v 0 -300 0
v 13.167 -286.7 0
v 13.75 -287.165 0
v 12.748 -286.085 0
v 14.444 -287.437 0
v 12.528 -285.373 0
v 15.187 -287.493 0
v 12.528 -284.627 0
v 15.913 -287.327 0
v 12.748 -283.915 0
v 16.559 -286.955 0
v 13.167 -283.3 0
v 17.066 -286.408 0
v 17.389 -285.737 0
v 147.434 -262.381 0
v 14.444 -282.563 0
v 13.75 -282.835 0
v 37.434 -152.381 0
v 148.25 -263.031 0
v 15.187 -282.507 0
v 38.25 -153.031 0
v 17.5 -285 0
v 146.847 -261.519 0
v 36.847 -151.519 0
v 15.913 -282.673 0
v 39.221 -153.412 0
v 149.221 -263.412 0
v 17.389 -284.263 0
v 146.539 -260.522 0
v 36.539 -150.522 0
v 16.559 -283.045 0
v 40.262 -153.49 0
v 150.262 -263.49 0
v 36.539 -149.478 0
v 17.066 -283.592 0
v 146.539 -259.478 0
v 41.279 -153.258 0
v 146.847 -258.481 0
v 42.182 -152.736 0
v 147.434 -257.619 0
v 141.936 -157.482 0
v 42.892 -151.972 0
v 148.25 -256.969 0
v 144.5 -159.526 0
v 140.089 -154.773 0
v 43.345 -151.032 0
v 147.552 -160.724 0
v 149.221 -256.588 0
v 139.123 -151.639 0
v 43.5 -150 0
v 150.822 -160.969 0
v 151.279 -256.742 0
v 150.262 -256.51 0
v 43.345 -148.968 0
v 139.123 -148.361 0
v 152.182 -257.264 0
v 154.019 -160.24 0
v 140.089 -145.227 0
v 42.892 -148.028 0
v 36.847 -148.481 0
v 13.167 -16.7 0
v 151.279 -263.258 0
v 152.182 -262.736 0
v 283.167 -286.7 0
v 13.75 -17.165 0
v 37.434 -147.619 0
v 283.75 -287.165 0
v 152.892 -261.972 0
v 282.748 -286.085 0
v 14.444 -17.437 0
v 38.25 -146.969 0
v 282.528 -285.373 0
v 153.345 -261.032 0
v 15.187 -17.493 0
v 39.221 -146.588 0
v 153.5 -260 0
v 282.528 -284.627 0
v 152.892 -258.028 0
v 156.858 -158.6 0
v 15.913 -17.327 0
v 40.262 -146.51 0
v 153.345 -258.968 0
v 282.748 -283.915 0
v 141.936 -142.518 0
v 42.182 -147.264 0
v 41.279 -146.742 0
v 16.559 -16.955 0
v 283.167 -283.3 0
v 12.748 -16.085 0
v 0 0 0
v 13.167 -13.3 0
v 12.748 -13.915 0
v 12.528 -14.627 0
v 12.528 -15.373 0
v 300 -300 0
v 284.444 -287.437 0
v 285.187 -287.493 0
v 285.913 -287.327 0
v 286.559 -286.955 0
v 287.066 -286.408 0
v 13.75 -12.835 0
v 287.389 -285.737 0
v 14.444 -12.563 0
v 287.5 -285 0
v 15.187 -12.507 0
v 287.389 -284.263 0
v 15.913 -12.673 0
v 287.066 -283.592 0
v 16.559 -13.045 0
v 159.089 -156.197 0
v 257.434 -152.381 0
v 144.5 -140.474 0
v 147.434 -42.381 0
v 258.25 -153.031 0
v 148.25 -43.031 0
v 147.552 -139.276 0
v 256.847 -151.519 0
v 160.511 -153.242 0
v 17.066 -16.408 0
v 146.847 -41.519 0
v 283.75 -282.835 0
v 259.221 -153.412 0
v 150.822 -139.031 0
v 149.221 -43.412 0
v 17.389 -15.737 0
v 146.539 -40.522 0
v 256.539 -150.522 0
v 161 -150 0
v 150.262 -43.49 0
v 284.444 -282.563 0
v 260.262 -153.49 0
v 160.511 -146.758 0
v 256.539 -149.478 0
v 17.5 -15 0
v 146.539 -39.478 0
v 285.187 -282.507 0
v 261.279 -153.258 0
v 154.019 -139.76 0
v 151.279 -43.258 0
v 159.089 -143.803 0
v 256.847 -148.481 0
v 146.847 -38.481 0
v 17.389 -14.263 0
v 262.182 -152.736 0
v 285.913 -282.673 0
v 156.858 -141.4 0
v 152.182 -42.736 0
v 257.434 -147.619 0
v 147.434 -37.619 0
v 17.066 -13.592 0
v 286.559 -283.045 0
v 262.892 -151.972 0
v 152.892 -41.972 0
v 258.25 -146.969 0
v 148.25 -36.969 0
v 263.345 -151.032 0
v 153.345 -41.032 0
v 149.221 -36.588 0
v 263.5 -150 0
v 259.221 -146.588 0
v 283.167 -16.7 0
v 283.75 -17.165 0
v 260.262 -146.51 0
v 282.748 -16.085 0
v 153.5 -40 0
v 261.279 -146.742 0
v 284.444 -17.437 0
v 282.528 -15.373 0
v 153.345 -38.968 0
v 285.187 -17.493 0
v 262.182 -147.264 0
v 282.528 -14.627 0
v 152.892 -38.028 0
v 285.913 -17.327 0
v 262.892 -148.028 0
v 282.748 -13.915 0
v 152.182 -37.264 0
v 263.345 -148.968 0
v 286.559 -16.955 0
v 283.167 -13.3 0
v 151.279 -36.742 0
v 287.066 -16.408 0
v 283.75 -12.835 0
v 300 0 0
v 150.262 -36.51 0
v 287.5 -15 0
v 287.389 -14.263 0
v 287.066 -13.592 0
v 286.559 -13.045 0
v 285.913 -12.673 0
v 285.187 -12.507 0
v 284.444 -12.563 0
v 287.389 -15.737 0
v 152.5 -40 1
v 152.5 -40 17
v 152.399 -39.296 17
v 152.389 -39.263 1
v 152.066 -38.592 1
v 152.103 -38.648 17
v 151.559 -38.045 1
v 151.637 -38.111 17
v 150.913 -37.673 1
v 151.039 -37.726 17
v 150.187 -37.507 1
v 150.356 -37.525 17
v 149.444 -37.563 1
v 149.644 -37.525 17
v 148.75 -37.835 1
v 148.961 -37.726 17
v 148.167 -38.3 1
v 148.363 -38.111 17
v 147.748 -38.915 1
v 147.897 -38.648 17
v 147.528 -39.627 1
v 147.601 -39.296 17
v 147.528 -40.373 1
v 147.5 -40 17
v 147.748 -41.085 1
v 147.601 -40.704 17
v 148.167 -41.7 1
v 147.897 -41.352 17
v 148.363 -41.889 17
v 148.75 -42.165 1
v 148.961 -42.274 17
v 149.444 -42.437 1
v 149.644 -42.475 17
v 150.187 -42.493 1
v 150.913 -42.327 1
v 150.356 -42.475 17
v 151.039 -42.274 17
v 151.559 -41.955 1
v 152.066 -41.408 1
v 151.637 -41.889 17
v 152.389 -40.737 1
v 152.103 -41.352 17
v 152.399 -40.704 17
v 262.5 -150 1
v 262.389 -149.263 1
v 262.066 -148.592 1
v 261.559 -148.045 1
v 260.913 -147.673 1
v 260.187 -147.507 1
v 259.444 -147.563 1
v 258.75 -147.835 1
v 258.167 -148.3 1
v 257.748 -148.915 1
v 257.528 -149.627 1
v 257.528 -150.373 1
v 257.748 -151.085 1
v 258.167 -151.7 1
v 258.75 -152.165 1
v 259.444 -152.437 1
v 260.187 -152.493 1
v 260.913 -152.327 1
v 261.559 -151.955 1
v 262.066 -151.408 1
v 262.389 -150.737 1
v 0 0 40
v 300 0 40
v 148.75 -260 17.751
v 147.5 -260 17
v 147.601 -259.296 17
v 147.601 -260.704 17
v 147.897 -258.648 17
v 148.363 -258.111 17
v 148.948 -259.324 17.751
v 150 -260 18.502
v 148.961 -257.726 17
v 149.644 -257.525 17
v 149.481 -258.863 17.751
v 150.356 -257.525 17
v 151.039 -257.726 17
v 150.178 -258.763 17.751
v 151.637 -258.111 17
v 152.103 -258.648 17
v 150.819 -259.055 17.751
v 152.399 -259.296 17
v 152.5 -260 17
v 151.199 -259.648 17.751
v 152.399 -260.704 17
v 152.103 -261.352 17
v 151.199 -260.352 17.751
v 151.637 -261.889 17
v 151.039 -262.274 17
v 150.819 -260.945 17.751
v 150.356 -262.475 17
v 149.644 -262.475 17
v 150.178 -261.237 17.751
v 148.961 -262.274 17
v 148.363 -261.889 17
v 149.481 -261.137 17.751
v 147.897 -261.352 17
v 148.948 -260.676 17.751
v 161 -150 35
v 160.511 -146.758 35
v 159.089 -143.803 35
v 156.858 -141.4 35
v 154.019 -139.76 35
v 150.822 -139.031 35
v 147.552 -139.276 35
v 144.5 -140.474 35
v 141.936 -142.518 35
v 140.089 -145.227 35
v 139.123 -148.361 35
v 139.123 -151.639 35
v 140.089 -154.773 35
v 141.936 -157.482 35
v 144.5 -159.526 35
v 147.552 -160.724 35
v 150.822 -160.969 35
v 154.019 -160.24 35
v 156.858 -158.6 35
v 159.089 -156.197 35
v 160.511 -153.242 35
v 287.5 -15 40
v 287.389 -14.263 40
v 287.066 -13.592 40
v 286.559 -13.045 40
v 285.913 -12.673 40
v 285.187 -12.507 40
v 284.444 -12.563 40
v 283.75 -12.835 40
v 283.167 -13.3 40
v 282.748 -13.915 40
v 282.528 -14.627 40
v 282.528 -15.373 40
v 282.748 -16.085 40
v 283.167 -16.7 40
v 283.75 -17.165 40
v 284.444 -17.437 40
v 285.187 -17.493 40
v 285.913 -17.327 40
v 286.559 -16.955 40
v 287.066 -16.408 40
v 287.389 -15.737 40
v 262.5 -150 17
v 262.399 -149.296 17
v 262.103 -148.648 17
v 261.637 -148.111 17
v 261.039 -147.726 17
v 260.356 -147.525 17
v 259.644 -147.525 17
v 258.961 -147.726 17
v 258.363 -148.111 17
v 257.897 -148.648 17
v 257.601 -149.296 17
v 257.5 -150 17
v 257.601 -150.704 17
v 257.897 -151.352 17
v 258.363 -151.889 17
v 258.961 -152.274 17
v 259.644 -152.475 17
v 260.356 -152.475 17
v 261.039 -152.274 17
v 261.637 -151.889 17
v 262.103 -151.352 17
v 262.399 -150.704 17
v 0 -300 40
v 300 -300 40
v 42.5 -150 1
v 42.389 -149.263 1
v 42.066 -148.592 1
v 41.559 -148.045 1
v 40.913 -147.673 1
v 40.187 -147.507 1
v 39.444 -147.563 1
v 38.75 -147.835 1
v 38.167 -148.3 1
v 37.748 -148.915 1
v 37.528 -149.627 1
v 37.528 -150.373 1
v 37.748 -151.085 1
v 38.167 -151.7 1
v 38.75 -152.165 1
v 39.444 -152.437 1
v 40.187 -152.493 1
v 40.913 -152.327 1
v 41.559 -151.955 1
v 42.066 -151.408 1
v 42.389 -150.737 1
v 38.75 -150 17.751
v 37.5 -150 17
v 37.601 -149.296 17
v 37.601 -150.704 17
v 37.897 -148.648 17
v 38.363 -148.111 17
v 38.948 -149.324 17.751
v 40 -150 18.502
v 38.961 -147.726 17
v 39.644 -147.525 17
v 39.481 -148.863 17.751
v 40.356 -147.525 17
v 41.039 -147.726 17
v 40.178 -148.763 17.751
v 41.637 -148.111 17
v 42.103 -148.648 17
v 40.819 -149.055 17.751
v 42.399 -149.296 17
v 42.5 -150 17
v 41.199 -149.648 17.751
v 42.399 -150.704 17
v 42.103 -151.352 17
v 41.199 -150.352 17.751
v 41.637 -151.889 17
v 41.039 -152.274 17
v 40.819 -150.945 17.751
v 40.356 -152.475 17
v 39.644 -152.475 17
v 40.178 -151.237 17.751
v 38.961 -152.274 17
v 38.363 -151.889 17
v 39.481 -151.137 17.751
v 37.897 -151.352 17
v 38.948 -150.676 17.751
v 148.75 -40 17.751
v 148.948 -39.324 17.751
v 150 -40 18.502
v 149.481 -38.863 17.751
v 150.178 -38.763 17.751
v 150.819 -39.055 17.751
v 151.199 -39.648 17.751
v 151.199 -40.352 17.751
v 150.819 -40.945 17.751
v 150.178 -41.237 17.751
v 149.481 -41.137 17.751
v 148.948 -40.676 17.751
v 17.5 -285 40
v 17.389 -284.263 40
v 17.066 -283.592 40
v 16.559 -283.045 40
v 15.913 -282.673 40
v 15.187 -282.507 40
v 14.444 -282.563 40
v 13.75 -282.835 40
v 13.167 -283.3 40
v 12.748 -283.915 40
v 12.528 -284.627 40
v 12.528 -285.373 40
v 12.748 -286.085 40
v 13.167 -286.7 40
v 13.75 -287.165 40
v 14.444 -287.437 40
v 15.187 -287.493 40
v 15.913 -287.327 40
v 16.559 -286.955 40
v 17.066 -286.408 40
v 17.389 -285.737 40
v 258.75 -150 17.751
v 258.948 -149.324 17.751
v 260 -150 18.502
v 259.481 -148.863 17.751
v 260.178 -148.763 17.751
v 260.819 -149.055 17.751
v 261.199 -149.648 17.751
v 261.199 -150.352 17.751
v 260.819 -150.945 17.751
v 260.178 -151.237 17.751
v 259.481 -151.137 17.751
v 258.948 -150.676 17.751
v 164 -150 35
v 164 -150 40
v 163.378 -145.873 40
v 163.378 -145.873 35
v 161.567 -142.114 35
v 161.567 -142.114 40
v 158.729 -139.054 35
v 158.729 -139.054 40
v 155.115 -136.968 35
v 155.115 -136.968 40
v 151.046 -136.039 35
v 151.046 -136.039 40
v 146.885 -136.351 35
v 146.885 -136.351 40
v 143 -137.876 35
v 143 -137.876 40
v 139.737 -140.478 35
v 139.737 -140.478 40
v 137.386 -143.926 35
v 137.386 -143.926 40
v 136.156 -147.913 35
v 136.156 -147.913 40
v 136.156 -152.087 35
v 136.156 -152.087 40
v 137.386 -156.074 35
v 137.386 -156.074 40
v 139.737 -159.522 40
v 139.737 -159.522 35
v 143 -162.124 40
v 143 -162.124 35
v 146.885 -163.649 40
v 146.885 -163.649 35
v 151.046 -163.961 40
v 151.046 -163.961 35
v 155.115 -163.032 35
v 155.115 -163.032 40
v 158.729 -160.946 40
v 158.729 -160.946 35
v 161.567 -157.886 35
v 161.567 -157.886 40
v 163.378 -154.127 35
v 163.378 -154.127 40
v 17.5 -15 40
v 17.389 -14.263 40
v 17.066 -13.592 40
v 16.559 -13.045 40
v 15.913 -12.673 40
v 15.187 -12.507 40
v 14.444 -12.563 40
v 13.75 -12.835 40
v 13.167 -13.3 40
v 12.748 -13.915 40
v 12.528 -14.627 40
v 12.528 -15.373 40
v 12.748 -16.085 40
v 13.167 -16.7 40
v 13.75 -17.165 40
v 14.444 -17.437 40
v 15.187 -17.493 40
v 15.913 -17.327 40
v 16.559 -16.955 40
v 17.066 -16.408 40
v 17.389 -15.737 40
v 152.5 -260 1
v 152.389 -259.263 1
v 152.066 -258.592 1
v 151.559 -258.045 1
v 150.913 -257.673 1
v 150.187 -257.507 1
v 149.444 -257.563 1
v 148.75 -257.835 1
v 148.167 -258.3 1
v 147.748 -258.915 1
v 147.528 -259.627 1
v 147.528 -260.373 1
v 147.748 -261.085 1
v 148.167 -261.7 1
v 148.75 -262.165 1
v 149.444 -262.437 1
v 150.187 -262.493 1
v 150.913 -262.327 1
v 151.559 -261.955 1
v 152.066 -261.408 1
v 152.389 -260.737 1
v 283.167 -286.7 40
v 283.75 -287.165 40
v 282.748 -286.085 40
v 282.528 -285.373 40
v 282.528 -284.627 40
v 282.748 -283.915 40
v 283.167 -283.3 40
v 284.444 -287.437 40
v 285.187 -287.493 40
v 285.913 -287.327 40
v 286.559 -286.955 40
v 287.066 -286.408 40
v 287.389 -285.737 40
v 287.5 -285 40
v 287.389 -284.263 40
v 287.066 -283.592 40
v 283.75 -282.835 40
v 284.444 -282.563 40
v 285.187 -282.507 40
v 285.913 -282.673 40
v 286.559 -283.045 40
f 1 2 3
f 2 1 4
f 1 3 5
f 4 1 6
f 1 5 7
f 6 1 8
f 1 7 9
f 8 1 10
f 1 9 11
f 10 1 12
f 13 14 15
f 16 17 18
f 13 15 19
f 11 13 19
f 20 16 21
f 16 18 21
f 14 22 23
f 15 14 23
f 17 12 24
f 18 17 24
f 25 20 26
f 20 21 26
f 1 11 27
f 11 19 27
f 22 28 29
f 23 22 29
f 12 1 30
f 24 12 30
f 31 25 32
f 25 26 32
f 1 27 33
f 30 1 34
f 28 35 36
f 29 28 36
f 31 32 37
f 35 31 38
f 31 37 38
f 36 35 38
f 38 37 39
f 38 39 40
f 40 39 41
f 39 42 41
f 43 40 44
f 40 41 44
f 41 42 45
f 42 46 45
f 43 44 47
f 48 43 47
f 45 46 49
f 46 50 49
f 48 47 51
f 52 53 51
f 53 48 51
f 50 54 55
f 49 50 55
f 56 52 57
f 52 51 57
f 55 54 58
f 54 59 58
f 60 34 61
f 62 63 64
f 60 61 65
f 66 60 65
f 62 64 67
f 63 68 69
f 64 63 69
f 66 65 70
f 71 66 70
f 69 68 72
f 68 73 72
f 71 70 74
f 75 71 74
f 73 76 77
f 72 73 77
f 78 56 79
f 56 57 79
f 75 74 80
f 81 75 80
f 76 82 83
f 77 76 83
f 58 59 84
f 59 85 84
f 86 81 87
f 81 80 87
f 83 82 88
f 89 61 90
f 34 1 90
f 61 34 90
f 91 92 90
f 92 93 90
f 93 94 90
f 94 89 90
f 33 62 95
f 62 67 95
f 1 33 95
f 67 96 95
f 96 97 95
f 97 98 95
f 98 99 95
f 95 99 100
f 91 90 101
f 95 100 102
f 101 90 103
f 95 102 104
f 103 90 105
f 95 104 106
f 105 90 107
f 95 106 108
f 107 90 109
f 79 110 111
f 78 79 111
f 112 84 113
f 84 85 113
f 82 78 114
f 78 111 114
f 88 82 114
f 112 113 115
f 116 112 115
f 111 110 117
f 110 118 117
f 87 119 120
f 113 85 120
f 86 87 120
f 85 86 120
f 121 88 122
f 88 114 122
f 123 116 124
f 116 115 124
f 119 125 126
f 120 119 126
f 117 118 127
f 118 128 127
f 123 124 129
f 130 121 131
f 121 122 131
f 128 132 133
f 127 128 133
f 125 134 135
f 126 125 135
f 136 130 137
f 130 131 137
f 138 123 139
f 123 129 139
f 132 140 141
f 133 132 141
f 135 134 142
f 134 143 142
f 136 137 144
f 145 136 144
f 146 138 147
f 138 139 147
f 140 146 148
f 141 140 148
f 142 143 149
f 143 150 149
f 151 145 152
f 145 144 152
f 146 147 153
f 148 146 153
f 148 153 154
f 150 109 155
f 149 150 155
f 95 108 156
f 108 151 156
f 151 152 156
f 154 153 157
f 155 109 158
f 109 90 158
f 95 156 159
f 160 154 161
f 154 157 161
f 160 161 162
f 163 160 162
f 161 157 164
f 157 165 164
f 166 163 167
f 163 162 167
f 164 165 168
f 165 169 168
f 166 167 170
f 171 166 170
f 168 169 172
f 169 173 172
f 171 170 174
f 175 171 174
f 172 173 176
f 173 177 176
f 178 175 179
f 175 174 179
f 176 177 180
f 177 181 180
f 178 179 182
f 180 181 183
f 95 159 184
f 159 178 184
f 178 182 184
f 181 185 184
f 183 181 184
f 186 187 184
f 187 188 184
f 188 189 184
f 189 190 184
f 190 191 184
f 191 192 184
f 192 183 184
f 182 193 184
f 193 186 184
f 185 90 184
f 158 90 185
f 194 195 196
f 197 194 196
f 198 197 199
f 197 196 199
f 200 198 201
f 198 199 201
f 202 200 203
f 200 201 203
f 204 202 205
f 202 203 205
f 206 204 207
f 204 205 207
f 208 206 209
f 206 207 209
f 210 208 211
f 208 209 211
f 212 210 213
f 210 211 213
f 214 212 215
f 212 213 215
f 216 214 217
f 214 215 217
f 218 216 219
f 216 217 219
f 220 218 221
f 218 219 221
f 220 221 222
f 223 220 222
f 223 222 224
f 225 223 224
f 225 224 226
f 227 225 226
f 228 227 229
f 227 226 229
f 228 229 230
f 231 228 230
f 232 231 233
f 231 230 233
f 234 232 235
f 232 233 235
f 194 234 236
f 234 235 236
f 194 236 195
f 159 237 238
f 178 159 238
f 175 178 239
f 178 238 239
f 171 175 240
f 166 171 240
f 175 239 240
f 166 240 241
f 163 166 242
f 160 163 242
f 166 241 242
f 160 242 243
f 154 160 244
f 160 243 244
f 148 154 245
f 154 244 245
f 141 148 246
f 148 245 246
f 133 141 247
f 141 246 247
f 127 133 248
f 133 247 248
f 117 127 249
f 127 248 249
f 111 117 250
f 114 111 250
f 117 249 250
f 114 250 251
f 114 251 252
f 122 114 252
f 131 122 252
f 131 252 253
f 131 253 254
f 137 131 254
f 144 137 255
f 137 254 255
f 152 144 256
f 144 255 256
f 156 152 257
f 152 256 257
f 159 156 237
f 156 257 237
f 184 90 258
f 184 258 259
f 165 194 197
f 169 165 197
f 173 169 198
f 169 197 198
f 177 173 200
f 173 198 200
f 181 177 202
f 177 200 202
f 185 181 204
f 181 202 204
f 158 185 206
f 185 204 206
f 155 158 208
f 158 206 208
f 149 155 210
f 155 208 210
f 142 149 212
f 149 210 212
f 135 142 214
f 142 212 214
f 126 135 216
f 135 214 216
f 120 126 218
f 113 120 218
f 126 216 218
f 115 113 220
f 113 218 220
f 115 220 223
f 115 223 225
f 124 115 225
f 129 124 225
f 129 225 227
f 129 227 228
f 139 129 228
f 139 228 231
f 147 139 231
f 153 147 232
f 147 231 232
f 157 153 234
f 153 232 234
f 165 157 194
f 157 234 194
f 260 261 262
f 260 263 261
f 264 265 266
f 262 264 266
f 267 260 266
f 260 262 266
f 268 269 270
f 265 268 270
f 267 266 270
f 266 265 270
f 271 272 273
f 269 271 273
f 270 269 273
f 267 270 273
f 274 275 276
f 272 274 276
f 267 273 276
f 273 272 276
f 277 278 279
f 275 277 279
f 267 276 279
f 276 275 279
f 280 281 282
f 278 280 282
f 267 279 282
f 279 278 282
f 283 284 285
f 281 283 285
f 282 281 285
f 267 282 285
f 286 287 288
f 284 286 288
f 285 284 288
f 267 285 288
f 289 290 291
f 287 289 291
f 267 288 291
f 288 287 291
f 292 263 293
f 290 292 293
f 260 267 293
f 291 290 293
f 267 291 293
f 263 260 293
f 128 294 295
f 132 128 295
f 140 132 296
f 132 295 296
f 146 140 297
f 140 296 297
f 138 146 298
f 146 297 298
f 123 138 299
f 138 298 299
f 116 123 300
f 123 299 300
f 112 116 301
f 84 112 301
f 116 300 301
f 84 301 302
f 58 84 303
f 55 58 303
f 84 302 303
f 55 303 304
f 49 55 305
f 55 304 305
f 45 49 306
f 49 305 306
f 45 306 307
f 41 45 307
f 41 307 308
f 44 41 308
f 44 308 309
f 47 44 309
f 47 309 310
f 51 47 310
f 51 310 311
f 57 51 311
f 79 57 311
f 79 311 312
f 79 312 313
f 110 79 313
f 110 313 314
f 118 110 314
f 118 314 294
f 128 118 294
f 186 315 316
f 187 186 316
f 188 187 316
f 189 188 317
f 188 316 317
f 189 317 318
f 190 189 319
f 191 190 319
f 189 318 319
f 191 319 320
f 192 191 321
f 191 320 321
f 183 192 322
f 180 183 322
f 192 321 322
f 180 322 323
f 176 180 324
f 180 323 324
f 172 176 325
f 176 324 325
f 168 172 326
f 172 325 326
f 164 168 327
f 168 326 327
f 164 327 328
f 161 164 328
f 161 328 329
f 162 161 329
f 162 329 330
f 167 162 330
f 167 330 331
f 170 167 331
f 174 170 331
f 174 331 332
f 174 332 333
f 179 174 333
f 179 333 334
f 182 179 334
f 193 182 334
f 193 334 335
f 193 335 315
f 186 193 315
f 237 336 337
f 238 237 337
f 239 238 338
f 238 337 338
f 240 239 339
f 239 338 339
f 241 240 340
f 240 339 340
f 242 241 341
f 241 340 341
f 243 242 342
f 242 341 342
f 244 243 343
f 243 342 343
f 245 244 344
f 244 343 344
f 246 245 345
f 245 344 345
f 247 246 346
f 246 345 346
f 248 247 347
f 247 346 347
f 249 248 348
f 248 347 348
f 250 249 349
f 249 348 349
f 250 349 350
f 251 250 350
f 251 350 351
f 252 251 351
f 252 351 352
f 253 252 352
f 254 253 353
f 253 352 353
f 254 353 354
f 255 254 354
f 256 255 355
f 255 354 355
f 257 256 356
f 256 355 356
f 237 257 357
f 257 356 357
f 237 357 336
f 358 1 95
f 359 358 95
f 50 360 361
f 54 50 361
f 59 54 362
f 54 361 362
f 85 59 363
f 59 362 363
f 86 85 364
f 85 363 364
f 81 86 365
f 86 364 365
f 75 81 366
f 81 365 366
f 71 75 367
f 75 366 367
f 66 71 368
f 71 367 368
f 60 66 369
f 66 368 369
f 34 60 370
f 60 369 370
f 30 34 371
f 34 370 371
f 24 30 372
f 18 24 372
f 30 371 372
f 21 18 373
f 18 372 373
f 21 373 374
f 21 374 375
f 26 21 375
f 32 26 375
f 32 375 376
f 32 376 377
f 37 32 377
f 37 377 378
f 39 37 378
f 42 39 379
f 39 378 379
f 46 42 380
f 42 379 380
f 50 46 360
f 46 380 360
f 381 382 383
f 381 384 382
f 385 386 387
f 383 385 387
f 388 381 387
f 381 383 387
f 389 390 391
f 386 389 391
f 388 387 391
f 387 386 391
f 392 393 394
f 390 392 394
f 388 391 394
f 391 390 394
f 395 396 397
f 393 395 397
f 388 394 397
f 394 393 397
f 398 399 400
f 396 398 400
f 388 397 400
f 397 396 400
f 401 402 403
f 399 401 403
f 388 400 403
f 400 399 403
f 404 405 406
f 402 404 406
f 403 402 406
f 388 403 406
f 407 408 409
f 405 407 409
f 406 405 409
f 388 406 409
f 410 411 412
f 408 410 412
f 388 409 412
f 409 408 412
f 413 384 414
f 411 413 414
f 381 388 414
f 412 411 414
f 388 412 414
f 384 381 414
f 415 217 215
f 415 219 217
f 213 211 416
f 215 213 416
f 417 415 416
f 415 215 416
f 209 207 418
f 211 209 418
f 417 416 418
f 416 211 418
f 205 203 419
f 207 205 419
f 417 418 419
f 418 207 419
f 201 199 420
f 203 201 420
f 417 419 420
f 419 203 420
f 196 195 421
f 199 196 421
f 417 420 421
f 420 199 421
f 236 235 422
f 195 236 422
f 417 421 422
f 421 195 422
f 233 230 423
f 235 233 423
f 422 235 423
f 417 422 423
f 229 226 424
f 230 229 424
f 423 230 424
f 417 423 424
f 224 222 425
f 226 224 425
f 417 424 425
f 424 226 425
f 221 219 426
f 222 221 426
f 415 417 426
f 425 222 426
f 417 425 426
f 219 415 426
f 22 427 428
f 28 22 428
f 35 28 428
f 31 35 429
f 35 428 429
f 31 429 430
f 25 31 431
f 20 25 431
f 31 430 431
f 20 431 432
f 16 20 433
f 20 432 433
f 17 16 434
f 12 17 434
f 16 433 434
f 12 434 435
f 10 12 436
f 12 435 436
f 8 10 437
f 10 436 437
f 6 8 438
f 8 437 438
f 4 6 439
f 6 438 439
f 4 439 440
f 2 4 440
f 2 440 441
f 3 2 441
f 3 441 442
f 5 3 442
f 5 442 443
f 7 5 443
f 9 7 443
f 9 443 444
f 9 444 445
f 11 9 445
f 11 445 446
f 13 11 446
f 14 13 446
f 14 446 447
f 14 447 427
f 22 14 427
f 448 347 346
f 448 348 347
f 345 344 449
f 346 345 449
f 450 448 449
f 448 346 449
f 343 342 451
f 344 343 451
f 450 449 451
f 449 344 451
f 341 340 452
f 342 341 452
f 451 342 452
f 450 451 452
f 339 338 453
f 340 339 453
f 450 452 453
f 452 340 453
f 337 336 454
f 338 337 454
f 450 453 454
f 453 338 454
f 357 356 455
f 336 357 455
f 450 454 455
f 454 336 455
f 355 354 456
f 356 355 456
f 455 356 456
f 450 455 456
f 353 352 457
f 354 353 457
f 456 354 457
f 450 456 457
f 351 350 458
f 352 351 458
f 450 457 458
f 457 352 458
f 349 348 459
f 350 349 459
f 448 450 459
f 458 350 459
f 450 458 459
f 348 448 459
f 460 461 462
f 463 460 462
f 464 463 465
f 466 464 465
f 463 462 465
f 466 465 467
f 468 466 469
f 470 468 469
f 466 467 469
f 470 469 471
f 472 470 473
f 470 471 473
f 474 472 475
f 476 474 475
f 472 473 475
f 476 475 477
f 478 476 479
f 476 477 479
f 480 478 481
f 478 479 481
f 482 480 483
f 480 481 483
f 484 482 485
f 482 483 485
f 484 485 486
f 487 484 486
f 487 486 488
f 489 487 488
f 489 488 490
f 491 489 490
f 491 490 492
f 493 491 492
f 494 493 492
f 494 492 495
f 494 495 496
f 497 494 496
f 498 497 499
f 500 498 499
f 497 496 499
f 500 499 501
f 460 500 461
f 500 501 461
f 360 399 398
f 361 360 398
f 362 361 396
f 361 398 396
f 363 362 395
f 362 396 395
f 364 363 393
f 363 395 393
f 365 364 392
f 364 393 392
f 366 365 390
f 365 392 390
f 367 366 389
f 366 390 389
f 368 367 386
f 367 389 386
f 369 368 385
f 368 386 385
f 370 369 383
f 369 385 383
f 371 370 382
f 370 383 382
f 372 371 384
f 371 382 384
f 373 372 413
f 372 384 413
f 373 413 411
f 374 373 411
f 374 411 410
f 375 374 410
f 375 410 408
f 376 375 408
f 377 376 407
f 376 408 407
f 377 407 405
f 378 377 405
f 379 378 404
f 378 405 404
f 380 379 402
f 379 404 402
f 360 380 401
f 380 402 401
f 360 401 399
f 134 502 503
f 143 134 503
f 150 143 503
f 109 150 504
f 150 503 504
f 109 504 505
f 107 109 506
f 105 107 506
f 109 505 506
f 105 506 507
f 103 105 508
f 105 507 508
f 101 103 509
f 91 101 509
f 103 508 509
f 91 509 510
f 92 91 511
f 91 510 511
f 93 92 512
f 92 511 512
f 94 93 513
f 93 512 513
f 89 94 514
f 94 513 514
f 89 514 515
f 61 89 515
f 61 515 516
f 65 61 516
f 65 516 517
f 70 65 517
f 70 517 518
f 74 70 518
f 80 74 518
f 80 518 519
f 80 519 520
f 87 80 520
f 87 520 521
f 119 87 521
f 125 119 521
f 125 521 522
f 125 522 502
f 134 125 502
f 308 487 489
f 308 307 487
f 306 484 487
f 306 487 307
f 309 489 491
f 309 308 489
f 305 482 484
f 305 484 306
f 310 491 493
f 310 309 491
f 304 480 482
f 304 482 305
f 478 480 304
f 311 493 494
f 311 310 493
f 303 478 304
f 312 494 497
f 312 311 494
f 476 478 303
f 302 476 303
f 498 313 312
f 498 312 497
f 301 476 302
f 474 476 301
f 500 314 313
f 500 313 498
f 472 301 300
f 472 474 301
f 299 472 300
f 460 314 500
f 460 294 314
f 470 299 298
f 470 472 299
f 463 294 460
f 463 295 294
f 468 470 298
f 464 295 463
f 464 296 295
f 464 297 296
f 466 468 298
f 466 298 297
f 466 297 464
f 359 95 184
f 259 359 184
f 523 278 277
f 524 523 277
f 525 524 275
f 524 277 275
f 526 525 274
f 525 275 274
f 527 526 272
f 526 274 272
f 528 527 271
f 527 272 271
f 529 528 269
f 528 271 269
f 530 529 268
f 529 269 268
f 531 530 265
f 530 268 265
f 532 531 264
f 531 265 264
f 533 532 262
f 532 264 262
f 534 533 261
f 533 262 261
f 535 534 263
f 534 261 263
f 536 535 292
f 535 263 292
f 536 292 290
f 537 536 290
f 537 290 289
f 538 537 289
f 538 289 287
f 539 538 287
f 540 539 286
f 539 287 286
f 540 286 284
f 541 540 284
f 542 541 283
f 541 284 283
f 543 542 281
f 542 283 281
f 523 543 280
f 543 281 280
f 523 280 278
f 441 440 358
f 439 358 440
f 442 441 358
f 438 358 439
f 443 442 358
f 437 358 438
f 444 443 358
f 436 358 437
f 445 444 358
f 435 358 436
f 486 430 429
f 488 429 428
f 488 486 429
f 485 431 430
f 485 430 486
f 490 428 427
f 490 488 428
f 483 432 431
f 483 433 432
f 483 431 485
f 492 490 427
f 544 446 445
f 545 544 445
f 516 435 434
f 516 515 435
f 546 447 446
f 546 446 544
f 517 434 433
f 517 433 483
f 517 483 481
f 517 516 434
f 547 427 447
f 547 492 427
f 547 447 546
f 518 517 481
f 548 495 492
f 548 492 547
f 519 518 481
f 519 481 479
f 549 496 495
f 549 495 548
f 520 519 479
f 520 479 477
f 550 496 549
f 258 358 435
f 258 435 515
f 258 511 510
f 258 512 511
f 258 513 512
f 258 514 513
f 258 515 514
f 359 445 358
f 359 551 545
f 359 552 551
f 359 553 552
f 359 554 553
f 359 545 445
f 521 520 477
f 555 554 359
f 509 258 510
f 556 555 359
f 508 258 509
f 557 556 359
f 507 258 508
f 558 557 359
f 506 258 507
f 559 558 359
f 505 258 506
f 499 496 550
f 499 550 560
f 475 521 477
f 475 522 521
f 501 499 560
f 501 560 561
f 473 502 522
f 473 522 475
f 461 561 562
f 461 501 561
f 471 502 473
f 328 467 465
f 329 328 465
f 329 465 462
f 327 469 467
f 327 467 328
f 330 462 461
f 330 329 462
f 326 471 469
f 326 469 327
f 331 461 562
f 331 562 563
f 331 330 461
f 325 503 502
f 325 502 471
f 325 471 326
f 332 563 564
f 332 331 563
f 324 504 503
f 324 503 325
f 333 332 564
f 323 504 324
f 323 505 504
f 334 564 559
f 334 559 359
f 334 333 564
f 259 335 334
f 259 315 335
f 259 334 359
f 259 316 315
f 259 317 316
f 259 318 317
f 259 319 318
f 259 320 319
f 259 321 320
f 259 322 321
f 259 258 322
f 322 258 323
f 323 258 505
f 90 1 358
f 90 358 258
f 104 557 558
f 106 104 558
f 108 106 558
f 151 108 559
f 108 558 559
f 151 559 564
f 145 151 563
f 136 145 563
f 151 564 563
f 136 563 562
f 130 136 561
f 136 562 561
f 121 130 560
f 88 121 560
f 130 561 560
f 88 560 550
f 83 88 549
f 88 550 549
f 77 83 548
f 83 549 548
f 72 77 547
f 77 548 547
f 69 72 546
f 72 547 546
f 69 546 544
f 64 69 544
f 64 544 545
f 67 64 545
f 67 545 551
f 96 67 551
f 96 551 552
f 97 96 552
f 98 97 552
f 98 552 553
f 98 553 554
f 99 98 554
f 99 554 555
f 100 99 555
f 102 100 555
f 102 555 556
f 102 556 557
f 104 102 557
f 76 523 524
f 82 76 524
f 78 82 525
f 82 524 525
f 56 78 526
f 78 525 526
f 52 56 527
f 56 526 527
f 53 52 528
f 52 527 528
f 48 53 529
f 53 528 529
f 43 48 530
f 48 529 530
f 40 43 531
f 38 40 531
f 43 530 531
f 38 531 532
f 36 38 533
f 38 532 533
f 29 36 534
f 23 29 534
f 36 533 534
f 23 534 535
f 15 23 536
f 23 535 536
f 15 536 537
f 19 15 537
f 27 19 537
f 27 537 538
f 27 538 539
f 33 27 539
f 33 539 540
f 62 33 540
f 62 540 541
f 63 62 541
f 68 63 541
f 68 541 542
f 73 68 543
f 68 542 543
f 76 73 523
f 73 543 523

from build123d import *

# Parameters (mm, degrees)
SKETCH_1_W          = 300
SKETCH_1_H          = 300
EXTRUDE_1_DEPTH     = 40
SKETCH_2_R          = 11
CUT_EXTRUDE_1_DEPTH = 427.145515053
M6X1_0_1_D          = 5
M6X1_0_1_DEPTH      = 17
M6X1_0_1_TIP        = 1.502151548
M6X1_0_2_D          = 5
M6X1_0_2_DEPTH      = 17
M6X1_0_2_TIP        = 1.502151548
M6X1_0_3_D          = 5
M6X1_0_3_DEPTH      = 17
M6X1_0_3_TIP        = 1.502151548
M6X1_0_4_D          = 5
M6X1_0_4_DEPTH      = 17
M6X1_0_4_TIP        = 1.502151548
SKETCH_3_R          = 14
CUT_EXTRUDE_2_DEPTH = 5
CHAMFER_1_SIZE      = 1
CHAMFER_2_SIZE      = 1
CHAMFER_3_SIZE      = 1
CHAMFER_4_SIZE      = 1
M6X1_0_5_D          = 5


with BuildPart() as part:
    # ｽｹｯﾁ1 → ﾎﾞｽ - 押し出し1 (new body)
    with BuildSketch(Plane.XY):
        with Locations((150, -150)):
            Rectangle(SKETCH_1_W, SKETCH_1_H)
    extrude(amount=EXTRUDE_1_DEPTH)

    # ｽｹｯﾁ2 → ｶｯﾄ - 押し出し1 (cut, through all)
    with BuildSketch(Plane.XY.offset(40)):
        with Locations((150, -150)):
            Circle(SKETCH_2_R)
    extrude(amount=-CUT_EXTRUDE_1_DEPTH, mode=Mode.SUBTRACT)

    # M6x1.0 ねじ穴1
    with Locations(Plane(origin=(0, 0, 0), x_dir=(-1, 0, 0), z_dir=(0, 0, -1))):
        with Locations((-260, -150)):
            Hole(M6X1_0_1_D / 2, depth=M6X1_0_1_DEPTH)
            with Locations((0, 0, -(M6X1_0_1_DEPTH + M6X1_0_1_TIP / 2))):  # 118° drill point
                Cone(0, M6X1_0_1_D / 2, M6X1_0_1_TIP, mode=Mode.SUBTRACT)

    # M6x1.0 ねじ穴2
    with Locations(Plane(origin=(0, 0, 0), x_dir=(-1, 0, 0), z_dir=(0, 0, -1))):
        with Locations((-150, -40)):
            Hole(M6X1_0_2_D / 2, depth=M6X1_0_2_DEPTH)
            with Locations((0, 0, -(M6X1_0_2_DEPTH + M6X1_0_2_TIP / 2))):  # 118° drill point
                Cone(0, M6X1_0_2_D / 2, M6X1_0_2_TIP, mode=Mode.SUBTRACT)

    # M6x1.0 ねじ穴3
    with Locations(Plane(origin=(40, -150, 0), x_dir=(-1, 0, 0), z_dir=(0, 0, -1))):
        with Locations((0, 0)):
            Hole(M6X1_0_3_D / 2, depth=M6X1_0_3_DEPTH)
            with Locations((0, 0, -(M6X1_0_3_DEPTH + M6X1_0_3_TIP / 2))):  # 118° drill point
                Cone(0, M6X1_0_3_D / 2, M6X1_0_3_TIP, mode=Mode.SUBTRACT)

    # M6x1.0 ねじ穴4
    with Locations(Plane(origin=(150, -260, 0), x_dir=(-1, 0, 0), z_dir=(0, 0, -1))):
        with Locations((0, 0)):
            Hole(M6X1_0_4_D / 2, depth=M6X1_0_4_DEPTH)
            with Locations((0, 0, -(M6X1_0_4_DEPTH + M6X1_0_4_TIP / 2))):  # 118° drill point
                Cone(0, M6X1_0_4_D / 2, M6X1_0_4_TIP, mode=Mode.SUBTRACT)

    # ｽｹｯﾁ3 → ｶｯﾄ - 押し出し2 (cut)
    with BuildSketch(Plane.XY.offset(40)):
        with Locations((150, -150)):
            Circle(SKETCH_3_R)
    extrude(amount=-CUT_EXTRUDE_2_DEPTH, mode=Mode.SUBTRACT)

    # 面取り1
    chamfer_1_edges = [part.edges().sort_by_distance(p)[0] for p in [
        (257.5, -150, 0),
    ]]
    chamfer(chamfer_1_edges, length=CHAMFER_1_SIZE)

    # 面取り2
    chamfer_2_edges = [part.edges().sort_by_distance(p)[0] for p in [
        (147.5, -40, 0),
    ]]
    chamfer(chamfer_2_edges, length=CHAMFER_2_SIZE)

    # 面取り3
    chamfer_3_edges = [part.edges().sort_by_distance(p)[0] for p in [
        (147.5, -260, 0),
    ]]
    chamfer(chamfer_3_edges, length=CHAMFER_3_SIZE)

    # 面取り4
    chamfer_4_edges = [part.edges().sort_by_distance(p)[0] for p in [
        (37.5, -150, 0),
    ]]
    chamfer(chamfer_4_edges, length=CHAMFER_4_SIZE)

    # M6x1.0 ねじ穴5 (through all)
    with Locations(Plane(origin=(285, -15, 0), x_dir=(-1, 0, 0), z_dir=(0, 0, -1))):
        with Locations((0, 0), (270, 0), (270, -270), (0, -270)):
            Hole(M6X1_0_5_D / 2)


solid = part.part
